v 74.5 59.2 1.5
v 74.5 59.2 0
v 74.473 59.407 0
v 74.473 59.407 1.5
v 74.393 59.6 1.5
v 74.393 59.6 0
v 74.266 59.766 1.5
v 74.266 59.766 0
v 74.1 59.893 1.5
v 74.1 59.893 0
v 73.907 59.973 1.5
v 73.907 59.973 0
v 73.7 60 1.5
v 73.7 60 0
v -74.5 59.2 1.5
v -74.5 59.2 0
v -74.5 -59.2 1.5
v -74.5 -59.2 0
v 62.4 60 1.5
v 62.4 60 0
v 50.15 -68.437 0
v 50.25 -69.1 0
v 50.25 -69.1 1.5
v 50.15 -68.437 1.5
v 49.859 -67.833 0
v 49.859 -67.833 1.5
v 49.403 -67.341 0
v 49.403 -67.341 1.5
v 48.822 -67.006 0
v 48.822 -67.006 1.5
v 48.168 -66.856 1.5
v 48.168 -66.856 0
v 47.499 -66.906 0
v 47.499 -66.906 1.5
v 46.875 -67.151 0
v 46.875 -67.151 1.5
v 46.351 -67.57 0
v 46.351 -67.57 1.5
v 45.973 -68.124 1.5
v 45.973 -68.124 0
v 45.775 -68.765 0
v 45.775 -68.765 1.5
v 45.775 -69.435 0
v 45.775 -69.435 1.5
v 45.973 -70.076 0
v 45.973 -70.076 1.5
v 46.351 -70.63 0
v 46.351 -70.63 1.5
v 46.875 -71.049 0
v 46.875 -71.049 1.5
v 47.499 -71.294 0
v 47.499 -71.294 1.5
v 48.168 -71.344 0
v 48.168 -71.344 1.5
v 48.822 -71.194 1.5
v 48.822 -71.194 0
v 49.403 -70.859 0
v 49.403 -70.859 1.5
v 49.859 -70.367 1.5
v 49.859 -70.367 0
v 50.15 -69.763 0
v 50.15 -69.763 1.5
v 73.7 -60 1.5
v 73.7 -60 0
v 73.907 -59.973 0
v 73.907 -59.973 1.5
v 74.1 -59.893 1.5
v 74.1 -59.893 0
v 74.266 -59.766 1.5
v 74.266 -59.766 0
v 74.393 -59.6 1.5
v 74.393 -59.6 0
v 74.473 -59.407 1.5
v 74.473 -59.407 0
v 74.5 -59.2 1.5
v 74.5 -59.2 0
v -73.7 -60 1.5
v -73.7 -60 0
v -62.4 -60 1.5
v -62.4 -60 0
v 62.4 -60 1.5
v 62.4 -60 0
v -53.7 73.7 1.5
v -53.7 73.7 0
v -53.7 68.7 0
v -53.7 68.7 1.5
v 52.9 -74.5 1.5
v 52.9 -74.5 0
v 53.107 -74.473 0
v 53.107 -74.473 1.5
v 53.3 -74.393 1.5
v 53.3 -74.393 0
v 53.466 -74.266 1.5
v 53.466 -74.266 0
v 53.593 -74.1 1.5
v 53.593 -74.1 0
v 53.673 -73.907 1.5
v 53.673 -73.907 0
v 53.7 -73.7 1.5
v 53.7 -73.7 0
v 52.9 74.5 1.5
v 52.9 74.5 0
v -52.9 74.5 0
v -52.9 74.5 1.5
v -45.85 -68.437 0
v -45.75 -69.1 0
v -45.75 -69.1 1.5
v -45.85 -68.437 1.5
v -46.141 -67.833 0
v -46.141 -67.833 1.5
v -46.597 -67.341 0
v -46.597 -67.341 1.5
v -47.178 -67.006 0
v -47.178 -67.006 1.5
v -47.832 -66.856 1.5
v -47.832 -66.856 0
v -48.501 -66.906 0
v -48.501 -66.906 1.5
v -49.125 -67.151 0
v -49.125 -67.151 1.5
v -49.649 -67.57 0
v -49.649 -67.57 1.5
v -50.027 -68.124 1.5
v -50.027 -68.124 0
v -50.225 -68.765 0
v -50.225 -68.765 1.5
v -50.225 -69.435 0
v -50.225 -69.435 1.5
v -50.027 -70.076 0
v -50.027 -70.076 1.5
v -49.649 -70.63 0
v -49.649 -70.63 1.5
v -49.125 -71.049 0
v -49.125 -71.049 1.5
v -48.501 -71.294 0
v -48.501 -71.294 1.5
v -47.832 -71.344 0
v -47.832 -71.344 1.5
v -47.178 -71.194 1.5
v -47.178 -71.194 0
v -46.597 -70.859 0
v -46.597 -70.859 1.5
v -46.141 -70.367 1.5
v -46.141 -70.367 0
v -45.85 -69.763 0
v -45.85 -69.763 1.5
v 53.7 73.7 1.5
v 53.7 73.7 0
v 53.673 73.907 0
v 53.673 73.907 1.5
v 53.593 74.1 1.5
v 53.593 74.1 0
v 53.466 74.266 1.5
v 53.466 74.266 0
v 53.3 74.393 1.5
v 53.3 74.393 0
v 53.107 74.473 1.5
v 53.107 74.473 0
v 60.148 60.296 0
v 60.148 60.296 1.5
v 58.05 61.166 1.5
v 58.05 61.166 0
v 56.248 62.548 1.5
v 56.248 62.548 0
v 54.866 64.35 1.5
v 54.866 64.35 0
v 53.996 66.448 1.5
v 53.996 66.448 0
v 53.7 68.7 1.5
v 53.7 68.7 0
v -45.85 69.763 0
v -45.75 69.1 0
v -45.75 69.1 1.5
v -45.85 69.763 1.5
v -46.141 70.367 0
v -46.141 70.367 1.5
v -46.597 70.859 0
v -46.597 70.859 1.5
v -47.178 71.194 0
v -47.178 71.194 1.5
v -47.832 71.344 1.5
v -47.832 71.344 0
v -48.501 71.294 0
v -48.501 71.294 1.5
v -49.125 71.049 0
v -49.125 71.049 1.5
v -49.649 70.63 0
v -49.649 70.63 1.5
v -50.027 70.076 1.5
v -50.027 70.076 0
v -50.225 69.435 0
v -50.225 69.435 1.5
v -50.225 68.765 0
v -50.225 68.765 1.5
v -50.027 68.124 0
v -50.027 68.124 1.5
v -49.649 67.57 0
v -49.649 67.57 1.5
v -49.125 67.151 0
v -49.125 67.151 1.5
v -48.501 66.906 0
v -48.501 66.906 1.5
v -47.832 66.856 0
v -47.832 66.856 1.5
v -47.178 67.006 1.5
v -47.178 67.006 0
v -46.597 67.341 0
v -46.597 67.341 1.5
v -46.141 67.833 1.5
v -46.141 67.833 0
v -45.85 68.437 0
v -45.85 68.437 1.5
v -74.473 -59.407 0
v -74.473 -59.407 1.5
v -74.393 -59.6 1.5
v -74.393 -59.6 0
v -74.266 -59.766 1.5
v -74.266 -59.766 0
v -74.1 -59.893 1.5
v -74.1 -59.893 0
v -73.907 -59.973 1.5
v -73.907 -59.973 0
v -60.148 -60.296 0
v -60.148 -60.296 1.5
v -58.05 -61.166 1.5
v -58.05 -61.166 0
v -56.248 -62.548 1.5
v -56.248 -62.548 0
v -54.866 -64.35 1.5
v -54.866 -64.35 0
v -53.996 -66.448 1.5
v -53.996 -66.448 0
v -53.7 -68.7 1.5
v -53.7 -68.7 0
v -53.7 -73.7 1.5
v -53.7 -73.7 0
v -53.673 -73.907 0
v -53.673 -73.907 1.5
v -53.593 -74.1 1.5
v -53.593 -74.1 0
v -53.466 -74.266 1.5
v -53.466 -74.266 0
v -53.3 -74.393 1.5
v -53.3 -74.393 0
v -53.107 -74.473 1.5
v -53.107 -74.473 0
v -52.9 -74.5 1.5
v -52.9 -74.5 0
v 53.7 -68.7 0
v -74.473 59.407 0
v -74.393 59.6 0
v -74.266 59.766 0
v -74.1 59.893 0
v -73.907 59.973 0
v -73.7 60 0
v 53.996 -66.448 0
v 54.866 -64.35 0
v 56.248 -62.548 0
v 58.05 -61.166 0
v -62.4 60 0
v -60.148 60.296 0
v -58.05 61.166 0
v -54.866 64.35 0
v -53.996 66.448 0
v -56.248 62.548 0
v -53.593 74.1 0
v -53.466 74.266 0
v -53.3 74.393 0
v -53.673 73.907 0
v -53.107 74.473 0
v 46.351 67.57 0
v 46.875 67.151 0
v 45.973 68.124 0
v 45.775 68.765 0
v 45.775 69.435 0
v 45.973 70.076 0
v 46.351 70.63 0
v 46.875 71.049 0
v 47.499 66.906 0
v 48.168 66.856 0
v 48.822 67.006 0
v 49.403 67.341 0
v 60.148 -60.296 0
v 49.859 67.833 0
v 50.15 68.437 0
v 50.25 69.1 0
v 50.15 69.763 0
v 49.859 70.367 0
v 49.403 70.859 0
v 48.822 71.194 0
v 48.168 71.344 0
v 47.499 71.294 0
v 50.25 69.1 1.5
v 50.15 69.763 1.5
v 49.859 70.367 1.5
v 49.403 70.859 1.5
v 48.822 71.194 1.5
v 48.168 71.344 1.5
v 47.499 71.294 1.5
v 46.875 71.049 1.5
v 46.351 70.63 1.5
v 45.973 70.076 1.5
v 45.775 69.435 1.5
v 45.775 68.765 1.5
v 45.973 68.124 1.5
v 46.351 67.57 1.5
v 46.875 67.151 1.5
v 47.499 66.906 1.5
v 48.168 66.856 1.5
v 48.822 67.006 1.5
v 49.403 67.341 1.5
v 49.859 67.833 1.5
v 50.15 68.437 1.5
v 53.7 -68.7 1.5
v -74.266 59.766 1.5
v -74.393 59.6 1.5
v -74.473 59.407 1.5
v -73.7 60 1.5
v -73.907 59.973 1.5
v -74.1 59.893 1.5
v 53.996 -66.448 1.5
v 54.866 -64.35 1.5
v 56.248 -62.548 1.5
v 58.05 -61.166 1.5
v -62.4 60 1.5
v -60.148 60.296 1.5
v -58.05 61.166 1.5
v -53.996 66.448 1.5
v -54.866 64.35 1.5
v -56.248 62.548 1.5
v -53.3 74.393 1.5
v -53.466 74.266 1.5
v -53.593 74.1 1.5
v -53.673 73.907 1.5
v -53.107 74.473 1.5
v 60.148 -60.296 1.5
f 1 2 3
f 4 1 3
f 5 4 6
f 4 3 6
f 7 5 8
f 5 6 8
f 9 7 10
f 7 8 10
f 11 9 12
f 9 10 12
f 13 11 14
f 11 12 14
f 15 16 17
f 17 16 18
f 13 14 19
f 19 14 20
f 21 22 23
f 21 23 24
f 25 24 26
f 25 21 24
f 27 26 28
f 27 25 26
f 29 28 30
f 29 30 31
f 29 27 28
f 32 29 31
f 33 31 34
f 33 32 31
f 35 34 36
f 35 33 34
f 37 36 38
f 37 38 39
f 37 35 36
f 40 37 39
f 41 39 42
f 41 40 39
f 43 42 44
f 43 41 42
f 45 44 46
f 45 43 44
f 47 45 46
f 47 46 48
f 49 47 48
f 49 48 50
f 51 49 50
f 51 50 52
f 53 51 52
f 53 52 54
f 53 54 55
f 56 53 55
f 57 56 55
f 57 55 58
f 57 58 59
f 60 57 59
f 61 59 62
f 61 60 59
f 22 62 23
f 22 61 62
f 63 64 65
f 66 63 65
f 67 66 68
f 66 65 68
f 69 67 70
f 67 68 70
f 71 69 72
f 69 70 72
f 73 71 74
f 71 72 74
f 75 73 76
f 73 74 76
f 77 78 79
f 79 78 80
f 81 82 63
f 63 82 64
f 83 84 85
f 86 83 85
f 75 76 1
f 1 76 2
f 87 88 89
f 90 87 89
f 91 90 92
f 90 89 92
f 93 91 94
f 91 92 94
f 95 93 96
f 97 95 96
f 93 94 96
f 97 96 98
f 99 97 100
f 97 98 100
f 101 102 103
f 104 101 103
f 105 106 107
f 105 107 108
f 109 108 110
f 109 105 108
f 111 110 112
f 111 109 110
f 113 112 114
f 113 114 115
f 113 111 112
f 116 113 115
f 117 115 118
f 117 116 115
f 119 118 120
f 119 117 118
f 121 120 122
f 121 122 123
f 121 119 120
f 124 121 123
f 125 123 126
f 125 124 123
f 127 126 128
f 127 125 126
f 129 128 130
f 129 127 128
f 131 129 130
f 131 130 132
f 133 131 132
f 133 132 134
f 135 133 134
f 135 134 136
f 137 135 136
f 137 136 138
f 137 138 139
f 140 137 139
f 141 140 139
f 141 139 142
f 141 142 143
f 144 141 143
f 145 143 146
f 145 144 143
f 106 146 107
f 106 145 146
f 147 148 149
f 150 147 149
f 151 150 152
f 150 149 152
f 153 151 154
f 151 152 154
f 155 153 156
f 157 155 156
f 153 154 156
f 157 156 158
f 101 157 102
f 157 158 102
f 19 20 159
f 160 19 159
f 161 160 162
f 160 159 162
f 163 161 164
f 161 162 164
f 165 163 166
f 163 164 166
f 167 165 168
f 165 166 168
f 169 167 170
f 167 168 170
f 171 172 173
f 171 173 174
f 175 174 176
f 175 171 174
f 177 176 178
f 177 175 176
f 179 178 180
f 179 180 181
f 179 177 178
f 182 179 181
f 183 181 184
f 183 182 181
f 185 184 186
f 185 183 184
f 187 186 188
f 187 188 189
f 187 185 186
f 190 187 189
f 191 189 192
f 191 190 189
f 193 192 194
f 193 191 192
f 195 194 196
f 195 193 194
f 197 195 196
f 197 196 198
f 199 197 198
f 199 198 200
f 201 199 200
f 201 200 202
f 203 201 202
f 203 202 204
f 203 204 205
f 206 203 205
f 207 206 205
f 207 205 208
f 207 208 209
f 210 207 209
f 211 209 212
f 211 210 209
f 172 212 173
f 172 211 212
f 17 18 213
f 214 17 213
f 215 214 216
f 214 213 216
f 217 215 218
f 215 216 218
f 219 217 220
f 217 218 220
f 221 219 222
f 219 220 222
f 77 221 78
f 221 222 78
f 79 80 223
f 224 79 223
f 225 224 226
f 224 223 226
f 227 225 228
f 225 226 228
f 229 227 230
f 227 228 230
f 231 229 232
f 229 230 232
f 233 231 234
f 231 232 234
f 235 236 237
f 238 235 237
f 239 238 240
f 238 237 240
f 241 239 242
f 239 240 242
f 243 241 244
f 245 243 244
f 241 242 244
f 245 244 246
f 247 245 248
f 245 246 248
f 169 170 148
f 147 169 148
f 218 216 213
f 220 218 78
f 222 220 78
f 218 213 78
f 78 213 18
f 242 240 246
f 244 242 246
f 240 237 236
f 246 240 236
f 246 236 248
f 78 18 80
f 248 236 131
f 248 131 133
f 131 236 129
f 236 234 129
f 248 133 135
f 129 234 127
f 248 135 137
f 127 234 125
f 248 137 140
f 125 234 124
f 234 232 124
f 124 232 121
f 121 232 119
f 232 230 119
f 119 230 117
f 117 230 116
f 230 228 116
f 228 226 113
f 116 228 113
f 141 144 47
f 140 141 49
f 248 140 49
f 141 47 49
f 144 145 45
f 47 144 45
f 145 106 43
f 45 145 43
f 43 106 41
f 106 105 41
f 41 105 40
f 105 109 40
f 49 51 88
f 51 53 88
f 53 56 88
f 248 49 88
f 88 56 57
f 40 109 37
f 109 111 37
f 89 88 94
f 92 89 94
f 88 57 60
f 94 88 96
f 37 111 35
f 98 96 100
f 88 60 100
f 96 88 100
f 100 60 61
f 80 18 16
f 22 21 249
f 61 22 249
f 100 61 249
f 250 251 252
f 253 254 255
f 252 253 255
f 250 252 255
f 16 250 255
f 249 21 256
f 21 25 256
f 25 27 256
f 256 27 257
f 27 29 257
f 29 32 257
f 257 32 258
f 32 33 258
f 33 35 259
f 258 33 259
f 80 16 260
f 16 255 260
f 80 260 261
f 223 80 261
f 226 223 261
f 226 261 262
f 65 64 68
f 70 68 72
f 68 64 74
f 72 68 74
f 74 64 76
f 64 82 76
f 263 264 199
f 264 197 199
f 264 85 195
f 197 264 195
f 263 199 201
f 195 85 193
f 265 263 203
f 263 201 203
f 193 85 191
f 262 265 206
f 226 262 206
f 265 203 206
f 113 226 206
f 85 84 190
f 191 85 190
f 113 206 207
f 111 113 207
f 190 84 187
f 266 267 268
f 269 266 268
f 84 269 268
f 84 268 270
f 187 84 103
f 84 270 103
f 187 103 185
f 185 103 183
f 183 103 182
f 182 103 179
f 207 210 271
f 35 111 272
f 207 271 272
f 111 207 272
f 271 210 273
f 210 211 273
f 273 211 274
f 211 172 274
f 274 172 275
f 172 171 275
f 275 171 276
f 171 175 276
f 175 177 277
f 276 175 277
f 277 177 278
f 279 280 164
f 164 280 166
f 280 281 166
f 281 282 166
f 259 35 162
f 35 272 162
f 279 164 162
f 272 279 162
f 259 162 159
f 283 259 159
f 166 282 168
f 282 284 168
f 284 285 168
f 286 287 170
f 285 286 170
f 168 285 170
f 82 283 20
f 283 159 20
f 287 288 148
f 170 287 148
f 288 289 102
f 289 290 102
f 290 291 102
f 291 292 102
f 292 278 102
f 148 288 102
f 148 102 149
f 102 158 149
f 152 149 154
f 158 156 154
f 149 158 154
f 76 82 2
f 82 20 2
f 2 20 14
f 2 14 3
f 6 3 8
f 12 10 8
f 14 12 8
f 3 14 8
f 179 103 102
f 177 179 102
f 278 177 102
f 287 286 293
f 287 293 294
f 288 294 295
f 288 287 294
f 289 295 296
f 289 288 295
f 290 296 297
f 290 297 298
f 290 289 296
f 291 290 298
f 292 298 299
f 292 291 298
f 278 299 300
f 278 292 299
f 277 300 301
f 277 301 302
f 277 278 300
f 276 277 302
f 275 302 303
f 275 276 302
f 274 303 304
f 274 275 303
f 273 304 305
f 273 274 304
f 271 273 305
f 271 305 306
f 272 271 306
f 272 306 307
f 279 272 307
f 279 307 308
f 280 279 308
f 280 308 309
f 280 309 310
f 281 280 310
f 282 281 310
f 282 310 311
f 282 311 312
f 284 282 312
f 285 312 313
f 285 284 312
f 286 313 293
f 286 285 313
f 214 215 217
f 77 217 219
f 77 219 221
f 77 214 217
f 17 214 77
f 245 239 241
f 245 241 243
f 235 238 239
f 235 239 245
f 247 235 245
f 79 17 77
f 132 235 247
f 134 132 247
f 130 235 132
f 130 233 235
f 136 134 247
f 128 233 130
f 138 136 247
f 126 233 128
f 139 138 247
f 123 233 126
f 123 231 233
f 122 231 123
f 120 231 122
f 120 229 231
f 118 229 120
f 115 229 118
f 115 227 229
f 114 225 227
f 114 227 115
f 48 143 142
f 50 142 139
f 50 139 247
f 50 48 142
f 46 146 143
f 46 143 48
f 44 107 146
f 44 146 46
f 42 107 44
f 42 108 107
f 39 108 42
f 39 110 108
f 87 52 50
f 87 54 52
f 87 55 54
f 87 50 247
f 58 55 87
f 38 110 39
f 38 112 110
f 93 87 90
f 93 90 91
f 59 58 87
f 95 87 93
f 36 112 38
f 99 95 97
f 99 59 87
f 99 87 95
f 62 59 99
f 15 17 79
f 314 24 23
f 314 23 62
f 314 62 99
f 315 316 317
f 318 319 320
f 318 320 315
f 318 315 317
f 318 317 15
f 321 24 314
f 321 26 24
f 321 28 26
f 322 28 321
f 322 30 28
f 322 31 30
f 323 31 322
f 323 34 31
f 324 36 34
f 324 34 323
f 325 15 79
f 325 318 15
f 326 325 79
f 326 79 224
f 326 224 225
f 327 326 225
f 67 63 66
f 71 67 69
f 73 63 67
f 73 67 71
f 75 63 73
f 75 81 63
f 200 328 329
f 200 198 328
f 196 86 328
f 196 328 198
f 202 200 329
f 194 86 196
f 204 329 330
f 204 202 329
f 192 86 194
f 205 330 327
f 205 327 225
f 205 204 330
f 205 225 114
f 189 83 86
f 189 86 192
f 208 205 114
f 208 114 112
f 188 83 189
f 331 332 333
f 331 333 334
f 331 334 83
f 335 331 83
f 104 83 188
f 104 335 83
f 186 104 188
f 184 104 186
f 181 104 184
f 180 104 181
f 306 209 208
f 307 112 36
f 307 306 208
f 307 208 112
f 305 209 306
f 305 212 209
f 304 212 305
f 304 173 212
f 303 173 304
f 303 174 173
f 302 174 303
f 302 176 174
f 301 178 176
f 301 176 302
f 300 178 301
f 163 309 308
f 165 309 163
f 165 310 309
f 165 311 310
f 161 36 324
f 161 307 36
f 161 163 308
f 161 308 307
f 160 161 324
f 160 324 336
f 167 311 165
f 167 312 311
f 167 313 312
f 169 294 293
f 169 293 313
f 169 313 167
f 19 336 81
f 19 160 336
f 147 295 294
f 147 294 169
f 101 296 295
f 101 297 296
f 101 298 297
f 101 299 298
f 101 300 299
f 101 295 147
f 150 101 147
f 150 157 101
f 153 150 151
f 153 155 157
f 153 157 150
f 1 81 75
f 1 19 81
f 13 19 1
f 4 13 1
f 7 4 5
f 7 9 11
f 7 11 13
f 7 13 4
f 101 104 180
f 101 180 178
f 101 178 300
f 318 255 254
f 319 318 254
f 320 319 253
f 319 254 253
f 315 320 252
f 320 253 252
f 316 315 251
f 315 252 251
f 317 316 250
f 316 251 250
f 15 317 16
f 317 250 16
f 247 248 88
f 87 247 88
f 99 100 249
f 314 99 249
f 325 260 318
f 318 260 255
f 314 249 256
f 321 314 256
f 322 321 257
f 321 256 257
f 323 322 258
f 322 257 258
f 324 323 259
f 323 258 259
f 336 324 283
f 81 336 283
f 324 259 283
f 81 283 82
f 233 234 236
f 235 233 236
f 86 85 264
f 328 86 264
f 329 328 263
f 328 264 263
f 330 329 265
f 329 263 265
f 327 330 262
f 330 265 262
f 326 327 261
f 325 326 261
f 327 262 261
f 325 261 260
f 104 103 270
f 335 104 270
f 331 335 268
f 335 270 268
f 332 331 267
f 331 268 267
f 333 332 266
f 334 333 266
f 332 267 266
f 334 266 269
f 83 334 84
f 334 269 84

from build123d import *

# Parameters (mm, degrees)
F0_R     = 2.25
F1_DEPTH = 1.5


with BuildPart() as f1:
    # F0 (on Top) → F1 (new body)
    with BuildSketch(Plane.XY):
        with BuildLine():
            Line((52.9, 74.5), (-52.9, 74.5))
            ThreePointArc((-52.9, 74.5), (-53.465685, 74.265685), (-53.7, 73.7))
            Line((-53.7, 73.7), (-53.7, 68.7))
            ThreePointArc((-53.7, 68.7), (-56.248171, 62.548171), (-62.4, 60))
            Line((-62.4, 60), (-73.7, 60))
            ThreePointArc((-73.7, 60), (-74.265685, 59.765685), (-74.5, 59.2))
            Line((-74.5, 59.2), (-74.5, -59.2))
            ThreePointArc((-74.5, -59.2), (-74.265685, -59.765685), (-73.7, -60))
            Line((-73.7, -60), (-62.4, -60))
            ThreePointArc((-62.4, -60), (-56.248171, -62.548171), (-53.7, -68.7))
            Line((-53.7, -68.7), (-53.7, -73.7))
            ThreePointArc((-53.7, -73.7), (-53.465685, -74.265685), (-52.9, -74.5))
            Line((-52.9, -74.5), (52.9, -74.5))
            ThreePointArc((52.9, -74.5), (53.465685, -74.265685), (53.7, -73.7))
            Line((53.7, -73.7), (53.7, -68.7))
            ThreePointArc((53.7, -68.7), (56.248171, -62.548171), (62.4, -60))
            Line((62.4, -60), (73.7, -60))
            ThreePointArc((73.7, -60), (74.265685, -59.765685), (74.5, -59.2))
            Line((74.5, -59.2), (74.5, 59.2))
            ThreePointArc((74.5, 59.2), (74.265685, 59.765685), (73.7, 60))
            Line((73.7, 60), (62.4, 60))
            ThreePointArc((62.4, 60), (56.248171, 62.548171), (53.7, 68.7))
            Line((53.7, 68.7), (53.7, 73.7))
            ThreePointArc((53.7, 73.7), (53.465685, 74.265685), (52.9, 74.5))
        make_face()
        with Locations((-48, -69.1)):
            Circle(F0_R, mode=Mode.SUBTRACT)
        with Locations((48, -69.1)):
            Circle(F0_R, mode=Mode.SUBTRACT)
        with Locations((-48, 69.1)):
            Circle(F0_R, mode=Mode.SUBTRACT)
        with Locations((48, 69.1)):
            Circle(F0_R, mode=Mode.SUBTRACT)
    extrude(amount=F1_DEPTH)


solid = f1.part
